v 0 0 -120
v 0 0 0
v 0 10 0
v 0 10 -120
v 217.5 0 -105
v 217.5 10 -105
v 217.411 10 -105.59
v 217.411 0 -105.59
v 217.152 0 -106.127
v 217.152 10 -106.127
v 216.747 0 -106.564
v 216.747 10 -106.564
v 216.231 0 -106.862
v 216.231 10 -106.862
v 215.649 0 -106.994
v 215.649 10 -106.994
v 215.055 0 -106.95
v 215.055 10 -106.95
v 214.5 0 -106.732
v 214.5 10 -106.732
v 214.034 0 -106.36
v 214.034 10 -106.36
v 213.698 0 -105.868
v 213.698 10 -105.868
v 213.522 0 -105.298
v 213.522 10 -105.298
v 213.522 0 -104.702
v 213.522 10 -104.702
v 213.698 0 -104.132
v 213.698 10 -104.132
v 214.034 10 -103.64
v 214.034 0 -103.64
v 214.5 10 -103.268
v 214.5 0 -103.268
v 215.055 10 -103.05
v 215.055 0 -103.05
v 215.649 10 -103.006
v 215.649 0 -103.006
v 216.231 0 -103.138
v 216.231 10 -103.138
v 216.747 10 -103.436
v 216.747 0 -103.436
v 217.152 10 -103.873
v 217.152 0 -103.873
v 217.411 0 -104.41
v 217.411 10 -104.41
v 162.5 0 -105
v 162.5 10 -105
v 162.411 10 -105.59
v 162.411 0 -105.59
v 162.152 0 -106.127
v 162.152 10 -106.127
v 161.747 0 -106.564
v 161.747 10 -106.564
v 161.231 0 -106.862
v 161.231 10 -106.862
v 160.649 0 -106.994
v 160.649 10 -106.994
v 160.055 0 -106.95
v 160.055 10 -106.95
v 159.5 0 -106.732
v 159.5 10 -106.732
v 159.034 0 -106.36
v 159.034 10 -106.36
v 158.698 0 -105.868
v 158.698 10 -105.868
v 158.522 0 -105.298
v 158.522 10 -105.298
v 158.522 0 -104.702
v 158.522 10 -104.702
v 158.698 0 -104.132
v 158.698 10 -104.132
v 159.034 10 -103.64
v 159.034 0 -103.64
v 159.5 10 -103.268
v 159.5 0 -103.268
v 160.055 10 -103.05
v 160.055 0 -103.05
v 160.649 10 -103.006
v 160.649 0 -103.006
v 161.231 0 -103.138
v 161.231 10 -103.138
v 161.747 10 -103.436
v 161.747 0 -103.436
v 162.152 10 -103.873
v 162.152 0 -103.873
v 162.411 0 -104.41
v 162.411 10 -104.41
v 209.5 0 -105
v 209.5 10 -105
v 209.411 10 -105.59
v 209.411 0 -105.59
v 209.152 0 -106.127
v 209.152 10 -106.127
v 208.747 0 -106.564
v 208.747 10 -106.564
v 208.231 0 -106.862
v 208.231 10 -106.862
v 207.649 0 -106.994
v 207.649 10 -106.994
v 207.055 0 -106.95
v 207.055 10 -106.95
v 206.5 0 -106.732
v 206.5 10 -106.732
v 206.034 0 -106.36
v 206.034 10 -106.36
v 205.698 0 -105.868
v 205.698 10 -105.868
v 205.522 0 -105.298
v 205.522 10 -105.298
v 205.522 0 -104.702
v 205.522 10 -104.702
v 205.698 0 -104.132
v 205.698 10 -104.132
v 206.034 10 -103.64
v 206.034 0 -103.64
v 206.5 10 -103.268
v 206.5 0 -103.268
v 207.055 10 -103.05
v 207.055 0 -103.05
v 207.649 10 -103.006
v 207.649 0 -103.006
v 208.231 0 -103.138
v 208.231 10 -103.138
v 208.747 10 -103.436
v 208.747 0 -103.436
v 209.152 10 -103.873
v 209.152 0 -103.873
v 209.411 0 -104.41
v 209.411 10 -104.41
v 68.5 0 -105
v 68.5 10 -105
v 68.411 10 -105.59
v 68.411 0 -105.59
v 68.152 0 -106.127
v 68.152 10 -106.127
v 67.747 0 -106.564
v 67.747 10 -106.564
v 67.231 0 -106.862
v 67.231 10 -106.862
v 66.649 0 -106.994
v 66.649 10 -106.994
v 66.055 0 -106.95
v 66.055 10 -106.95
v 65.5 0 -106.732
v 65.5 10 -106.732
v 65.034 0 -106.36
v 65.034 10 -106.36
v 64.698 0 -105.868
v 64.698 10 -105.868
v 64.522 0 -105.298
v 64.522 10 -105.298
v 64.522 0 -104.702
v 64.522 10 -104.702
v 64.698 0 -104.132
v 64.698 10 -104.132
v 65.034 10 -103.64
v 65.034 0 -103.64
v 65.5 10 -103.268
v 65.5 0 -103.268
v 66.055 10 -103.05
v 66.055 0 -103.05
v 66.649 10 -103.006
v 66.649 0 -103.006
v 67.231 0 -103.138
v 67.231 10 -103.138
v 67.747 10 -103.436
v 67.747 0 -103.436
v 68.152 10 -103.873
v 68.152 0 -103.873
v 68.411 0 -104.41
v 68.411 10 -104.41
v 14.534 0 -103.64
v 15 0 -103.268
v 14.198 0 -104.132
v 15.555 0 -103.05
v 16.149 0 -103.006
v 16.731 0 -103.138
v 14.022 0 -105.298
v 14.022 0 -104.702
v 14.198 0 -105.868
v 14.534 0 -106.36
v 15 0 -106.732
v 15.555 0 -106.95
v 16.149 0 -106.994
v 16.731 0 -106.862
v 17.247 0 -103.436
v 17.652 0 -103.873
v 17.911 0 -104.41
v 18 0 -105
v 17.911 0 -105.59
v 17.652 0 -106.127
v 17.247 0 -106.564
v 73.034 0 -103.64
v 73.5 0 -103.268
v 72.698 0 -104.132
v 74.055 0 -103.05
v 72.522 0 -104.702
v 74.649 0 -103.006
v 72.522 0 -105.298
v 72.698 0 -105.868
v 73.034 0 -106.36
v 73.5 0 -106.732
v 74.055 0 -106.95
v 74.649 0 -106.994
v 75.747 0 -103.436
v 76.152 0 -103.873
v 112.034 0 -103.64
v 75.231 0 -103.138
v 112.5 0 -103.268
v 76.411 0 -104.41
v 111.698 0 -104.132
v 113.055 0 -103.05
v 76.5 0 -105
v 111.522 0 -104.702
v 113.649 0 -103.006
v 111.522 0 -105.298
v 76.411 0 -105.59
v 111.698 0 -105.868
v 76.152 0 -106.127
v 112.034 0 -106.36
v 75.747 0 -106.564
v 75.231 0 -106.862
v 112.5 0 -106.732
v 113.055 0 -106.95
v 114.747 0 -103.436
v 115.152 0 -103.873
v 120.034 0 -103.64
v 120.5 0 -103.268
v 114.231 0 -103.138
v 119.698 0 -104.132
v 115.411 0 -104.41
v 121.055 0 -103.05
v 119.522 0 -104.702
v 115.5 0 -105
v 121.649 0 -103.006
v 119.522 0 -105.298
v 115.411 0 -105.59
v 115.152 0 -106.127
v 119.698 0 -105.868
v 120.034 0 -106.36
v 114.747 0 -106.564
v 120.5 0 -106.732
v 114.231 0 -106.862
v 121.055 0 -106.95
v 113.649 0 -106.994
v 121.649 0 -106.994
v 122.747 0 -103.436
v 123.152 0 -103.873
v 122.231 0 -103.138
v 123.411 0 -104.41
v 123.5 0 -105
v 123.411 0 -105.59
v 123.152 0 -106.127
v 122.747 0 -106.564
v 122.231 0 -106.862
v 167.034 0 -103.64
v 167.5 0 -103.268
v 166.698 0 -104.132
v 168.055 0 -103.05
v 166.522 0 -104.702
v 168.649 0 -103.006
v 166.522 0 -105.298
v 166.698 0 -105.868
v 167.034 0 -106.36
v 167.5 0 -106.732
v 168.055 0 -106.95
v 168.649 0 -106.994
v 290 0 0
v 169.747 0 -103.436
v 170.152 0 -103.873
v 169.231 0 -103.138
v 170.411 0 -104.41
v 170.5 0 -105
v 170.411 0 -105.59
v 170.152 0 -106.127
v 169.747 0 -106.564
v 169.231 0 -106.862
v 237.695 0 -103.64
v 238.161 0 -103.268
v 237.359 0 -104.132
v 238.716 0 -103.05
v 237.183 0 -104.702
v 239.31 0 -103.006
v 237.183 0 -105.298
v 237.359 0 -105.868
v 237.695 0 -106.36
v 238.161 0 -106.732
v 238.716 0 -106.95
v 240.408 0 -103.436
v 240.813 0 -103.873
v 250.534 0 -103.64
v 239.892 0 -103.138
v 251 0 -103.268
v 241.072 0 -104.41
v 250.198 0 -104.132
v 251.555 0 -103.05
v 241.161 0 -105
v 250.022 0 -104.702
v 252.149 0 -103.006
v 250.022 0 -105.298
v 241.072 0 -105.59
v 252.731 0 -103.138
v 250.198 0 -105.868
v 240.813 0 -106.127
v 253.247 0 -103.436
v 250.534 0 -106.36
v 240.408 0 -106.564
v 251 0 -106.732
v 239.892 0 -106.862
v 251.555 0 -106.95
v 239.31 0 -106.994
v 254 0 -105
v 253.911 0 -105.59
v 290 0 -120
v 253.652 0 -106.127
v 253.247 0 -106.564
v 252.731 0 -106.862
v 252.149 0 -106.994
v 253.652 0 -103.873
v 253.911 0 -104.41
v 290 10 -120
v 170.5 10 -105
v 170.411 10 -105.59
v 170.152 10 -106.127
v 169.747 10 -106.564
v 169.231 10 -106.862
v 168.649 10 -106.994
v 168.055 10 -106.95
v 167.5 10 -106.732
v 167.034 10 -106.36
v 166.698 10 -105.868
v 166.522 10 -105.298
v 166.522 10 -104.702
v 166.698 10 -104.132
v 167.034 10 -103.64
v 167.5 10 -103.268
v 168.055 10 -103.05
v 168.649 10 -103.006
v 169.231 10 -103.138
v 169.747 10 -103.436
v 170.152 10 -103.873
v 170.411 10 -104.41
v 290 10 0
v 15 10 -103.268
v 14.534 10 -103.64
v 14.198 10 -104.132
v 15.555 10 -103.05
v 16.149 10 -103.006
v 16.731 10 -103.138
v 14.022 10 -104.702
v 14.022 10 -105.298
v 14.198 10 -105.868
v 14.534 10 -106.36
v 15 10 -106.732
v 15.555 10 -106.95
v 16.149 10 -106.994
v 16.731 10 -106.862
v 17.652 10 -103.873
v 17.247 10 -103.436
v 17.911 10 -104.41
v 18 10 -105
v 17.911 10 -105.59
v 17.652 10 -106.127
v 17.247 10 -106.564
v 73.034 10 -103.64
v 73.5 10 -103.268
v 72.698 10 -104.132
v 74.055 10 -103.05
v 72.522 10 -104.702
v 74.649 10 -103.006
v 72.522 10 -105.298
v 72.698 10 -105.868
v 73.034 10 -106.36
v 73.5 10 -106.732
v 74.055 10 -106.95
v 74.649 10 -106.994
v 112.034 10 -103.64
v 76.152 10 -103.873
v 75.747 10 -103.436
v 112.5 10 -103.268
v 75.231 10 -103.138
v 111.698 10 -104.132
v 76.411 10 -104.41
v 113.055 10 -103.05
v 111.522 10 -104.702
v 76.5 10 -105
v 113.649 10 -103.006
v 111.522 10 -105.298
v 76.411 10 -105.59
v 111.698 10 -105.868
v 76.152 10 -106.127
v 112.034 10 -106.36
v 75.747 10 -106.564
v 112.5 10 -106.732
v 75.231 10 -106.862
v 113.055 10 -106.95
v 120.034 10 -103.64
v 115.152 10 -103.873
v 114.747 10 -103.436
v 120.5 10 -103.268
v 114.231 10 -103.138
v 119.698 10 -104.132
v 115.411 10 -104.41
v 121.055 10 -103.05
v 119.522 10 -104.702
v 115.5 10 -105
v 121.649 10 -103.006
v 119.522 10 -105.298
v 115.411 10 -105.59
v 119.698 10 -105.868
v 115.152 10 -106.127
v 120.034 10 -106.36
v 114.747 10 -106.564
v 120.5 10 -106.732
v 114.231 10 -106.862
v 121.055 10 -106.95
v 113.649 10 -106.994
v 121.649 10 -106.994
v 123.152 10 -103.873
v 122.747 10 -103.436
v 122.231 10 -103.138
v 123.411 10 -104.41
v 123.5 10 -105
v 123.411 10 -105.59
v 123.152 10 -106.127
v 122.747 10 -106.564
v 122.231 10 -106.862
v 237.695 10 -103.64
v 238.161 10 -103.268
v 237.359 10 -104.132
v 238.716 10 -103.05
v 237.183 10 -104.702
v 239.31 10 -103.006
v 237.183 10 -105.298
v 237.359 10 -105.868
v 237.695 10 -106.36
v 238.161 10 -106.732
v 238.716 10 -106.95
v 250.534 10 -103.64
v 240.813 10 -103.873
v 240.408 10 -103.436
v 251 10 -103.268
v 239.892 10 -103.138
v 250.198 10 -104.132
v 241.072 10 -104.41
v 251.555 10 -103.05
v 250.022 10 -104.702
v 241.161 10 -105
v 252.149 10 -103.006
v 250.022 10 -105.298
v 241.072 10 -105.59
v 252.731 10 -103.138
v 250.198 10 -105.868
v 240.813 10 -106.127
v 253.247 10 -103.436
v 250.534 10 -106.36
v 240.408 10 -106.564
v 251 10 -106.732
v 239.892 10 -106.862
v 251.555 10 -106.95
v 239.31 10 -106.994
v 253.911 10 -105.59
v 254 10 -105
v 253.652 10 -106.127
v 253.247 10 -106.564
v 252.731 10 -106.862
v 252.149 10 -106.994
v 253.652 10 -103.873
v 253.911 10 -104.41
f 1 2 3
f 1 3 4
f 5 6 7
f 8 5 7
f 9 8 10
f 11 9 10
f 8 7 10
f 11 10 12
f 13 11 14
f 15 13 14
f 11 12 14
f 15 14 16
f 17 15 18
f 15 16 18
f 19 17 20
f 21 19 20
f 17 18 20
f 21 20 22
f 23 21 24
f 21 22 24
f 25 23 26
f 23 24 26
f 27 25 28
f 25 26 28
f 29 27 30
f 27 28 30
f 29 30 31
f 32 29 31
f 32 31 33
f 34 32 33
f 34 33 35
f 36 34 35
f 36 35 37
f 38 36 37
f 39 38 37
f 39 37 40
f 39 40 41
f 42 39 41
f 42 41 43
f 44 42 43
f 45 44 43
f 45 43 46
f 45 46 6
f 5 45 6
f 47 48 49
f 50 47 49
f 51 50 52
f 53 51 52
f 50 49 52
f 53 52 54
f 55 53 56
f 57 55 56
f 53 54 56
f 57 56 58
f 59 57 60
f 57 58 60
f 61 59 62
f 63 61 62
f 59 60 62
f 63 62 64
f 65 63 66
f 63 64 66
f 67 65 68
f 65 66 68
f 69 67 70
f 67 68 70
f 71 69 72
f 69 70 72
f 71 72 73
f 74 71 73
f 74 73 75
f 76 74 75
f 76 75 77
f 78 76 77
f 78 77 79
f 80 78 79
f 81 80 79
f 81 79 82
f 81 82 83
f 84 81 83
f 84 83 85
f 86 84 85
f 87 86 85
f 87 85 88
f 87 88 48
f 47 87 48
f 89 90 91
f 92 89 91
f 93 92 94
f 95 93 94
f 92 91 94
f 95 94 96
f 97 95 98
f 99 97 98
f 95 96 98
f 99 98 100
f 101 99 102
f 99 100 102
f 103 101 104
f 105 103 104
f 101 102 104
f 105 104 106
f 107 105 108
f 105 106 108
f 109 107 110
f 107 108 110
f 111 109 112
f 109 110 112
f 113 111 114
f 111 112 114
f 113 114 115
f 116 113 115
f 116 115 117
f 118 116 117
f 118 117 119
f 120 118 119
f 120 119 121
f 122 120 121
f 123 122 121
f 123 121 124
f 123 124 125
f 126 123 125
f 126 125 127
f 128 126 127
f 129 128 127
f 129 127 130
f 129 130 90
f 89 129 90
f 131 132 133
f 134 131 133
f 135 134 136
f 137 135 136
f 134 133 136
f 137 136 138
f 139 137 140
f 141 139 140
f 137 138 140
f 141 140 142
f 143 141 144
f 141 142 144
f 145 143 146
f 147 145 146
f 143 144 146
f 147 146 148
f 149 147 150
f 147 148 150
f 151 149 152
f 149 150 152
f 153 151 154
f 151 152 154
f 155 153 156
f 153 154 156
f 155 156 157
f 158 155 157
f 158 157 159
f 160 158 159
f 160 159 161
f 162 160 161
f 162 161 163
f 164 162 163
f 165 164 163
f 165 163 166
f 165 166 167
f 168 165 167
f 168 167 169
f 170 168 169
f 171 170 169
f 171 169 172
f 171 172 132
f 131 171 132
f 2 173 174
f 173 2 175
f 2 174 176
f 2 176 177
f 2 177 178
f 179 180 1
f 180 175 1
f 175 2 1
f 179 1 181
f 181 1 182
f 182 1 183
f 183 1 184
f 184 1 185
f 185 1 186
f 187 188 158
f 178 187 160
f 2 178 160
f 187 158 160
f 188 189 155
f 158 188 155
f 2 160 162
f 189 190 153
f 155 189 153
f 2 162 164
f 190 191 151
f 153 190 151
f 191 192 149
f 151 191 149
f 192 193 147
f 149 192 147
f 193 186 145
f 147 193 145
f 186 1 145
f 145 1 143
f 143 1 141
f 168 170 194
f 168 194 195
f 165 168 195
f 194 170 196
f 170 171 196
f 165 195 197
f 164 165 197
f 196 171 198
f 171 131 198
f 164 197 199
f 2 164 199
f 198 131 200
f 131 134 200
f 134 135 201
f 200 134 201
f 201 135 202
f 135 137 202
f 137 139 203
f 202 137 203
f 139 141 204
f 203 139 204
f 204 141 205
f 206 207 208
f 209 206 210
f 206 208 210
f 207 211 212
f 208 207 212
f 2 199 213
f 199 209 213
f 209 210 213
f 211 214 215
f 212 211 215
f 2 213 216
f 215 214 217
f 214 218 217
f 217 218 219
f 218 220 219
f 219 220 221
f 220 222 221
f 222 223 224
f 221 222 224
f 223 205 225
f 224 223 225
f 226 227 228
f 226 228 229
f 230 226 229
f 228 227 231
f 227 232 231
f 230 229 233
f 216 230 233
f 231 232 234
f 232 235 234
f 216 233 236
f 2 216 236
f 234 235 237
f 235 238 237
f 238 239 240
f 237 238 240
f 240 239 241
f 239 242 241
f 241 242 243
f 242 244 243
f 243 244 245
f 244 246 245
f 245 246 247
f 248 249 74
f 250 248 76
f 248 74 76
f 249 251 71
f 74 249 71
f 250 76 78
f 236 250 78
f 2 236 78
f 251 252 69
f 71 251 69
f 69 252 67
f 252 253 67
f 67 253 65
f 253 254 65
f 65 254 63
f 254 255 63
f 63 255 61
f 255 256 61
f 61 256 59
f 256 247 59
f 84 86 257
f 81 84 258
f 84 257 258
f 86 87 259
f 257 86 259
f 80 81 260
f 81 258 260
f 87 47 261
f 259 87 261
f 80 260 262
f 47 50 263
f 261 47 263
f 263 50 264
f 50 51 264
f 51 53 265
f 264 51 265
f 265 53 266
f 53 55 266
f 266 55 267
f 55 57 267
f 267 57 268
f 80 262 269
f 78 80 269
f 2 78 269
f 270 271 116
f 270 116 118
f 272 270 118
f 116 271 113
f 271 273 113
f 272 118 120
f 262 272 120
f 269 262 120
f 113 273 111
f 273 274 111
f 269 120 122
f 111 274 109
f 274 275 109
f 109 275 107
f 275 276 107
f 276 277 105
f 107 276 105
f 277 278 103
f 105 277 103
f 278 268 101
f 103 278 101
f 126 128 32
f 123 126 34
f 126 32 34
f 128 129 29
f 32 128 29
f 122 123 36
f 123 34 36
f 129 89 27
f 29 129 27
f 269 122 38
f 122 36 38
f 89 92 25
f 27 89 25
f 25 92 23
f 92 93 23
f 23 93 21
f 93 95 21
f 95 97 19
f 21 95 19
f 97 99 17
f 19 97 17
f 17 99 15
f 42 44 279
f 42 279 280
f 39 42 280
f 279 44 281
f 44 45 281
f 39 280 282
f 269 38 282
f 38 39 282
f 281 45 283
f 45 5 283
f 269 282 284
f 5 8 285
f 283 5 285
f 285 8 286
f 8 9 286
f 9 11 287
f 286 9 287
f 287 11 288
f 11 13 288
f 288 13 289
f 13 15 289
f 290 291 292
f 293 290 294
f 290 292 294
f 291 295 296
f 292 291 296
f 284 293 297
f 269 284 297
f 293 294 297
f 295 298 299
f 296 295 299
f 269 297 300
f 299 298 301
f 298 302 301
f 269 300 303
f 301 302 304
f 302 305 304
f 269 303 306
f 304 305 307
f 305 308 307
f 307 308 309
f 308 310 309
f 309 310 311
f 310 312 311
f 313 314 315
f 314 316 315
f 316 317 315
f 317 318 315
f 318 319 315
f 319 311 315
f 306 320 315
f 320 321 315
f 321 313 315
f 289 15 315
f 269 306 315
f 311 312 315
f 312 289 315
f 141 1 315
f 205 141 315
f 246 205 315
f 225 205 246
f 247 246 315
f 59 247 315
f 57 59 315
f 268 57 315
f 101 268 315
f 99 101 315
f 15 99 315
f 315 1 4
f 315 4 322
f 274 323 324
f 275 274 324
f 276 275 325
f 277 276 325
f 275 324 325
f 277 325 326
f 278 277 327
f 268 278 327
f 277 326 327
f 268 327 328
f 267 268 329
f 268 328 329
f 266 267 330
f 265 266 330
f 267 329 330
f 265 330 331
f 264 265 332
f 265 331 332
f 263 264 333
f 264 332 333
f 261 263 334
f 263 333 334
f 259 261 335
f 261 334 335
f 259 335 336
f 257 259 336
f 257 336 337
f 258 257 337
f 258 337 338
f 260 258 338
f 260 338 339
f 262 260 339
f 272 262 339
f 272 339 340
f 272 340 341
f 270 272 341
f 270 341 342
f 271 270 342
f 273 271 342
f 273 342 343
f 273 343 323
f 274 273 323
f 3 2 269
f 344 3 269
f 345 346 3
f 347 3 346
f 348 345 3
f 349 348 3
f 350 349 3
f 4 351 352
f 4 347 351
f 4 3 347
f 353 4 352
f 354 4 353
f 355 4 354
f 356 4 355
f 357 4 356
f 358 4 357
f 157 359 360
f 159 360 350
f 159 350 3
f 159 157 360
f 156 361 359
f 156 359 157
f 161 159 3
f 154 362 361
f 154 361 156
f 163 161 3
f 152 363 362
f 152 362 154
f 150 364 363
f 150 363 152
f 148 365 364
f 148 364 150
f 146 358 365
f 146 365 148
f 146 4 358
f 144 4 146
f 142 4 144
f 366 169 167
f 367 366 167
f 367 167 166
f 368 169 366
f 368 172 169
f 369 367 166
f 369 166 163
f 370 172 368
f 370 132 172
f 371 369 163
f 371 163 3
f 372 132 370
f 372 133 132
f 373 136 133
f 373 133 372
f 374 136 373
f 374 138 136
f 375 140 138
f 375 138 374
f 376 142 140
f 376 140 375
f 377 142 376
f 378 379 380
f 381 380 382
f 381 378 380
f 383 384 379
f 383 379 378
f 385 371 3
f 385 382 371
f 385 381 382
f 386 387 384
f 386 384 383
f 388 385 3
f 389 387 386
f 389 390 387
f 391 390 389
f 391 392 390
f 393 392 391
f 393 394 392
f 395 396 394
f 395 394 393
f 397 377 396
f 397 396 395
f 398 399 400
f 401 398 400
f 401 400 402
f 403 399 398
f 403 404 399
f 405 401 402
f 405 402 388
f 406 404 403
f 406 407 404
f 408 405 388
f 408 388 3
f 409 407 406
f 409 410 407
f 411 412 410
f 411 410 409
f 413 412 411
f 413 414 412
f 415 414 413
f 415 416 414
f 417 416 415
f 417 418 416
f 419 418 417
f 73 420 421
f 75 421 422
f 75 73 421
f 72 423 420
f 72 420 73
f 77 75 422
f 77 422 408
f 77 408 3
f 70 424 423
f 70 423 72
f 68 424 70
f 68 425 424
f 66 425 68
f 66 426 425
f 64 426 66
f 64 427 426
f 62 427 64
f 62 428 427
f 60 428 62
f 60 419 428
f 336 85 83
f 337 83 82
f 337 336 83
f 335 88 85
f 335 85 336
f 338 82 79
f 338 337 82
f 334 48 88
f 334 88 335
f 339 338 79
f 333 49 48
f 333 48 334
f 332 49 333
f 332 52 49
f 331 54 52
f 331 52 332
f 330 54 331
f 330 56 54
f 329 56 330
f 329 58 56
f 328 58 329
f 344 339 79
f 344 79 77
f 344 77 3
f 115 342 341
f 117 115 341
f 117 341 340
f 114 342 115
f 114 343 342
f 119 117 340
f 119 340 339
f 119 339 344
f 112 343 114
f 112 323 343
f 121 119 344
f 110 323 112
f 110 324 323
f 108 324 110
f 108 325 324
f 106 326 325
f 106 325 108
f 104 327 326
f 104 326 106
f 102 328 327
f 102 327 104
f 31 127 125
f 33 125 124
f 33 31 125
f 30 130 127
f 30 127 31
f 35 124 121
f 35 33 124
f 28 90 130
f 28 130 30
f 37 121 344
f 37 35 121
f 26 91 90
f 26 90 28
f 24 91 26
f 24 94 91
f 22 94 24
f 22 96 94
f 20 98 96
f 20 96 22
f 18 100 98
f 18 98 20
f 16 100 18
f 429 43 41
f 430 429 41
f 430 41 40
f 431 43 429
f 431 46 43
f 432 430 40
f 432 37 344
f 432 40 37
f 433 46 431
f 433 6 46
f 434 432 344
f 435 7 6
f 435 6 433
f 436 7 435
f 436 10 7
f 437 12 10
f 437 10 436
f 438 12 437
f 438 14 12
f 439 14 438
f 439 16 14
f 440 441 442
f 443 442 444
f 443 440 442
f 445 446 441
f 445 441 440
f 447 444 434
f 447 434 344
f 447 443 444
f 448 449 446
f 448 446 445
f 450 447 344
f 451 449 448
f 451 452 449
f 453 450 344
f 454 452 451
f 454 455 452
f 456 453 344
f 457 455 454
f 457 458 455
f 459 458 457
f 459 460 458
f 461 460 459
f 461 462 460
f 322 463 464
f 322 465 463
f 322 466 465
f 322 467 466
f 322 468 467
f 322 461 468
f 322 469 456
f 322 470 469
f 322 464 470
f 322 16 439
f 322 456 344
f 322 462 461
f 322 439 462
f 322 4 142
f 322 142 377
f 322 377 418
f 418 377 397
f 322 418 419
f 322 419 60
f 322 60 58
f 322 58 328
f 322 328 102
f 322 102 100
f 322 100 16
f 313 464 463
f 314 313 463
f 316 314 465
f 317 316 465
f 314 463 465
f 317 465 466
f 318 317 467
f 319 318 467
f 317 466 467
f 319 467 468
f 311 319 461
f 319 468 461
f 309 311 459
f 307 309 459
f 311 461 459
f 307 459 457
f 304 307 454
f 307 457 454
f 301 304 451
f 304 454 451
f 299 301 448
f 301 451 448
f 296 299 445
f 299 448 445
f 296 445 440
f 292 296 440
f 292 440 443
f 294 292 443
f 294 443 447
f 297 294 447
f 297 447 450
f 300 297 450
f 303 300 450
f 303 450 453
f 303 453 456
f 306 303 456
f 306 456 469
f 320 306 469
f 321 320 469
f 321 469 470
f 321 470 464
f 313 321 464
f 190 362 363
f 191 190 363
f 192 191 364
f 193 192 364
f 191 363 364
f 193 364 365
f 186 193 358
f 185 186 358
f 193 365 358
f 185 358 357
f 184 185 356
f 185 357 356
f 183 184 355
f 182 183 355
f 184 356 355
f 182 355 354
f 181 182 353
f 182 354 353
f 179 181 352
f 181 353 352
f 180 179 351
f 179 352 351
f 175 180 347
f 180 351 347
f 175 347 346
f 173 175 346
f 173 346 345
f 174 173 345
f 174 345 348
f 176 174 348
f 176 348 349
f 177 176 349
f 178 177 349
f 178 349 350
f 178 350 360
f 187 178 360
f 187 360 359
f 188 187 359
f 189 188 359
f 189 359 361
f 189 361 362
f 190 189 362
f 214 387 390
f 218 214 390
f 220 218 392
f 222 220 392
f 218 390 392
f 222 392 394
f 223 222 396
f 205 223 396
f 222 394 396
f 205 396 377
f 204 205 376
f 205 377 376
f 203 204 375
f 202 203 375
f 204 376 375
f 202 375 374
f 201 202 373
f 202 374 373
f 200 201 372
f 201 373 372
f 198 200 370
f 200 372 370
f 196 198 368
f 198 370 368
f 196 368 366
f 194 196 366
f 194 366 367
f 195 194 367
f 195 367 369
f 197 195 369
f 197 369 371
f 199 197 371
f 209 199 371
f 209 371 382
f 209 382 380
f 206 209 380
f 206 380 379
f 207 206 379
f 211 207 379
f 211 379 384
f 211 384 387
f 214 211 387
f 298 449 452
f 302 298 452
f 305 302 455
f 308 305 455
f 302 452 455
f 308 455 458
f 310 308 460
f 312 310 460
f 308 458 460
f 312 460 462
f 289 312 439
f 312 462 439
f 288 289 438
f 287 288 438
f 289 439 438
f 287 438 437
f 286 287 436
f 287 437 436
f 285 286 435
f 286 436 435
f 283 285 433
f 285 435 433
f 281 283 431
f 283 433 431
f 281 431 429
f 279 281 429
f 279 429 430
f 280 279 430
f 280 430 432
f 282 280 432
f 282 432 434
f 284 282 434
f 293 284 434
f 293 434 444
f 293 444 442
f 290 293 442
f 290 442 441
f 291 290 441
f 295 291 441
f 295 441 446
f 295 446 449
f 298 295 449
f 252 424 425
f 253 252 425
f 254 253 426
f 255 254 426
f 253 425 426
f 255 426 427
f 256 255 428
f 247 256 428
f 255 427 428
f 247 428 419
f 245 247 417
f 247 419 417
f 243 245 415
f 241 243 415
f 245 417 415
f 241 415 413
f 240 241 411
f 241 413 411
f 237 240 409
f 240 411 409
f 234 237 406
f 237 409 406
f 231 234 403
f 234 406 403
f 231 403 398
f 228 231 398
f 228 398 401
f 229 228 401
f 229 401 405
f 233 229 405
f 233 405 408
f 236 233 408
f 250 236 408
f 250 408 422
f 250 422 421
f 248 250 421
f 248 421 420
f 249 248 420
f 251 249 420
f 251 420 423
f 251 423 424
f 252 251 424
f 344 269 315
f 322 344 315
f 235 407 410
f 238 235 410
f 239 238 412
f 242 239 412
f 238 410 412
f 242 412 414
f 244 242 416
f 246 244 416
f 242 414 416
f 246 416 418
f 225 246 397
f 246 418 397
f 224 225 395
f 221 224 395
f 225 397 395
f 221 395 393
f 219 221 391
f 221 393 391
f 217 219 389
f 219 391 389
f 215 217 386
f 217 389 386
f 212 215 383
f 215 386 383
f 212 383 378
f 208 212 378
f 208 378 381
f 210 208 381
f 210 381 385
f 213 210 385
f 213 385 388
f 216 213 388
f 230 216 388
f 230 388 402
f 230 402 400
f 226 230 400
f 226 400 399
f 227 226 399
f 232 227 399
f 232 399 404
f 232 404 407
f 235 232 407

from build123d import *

# Parameters (mm, degrees)
SKETCH_1_W          = 290
SKETCH_1_H          = 120
EXTRUDE_1_DEPTH     = 10
SKETCH_2_R          = 2
CUT_EXTRUDE_1_DEPTH = 11


with BuildPart() as part:
    # Эскиз1 → Бобышка-Вытянуть1 (new body)
    with BuildSketch(Plane(origin=(0, 0, 0), x_dir=(1, 0, 0), z_dir=(0, 1, 0))):
        with Locations((145, 60)):
            Rectangle(SKETCH_1_W, SKETCH_1_H)
    extrude(amount=EXTRUDE_1_DEPTH)

    # Эскиз2 → Вырез-Вытянуть1 (cut, through all)
    with BuildSketch(Plane(origin=(0, 10, 0), x_dir=(1, 0, 0), z_dir=(0, 1, 0))):
        with Locations((16, 105)):
            Circle(SKETCH_2_R)
        with Locations((252, 105)):
            Circle(SKETCH_2_R)
        with Locations((66.5, 105)):
            Circle(SKETCH_2_R)
        with Locations((74.5, 105)):
            Circle(SKETCH_2_R)
        with Locations((113.5, 105)):
            Circle(SKETCH_2_R)
        with Locations((121.5, 105)):
            Circle(SKETCH_2_R)
        with Locations((160.5, 105)):
            Circle(SKETCH_2_R)
        with Locations((168.5, 105)):
            Circle(SKETCH_2_R)
        with Locations((207.5, 105)):
            Circle(SKETCH_2_R)
        with Locations((215.5, 105)):
            Circle(SKETCH_2_R)
        with Locations((239.16098685, 105)):
            Circle(SKETCH_2_R)
    extrude(amount=-CUT_EXTRUDE_1_DEPTH, mode=Mode.SUBTRACT)


solid = part.part
